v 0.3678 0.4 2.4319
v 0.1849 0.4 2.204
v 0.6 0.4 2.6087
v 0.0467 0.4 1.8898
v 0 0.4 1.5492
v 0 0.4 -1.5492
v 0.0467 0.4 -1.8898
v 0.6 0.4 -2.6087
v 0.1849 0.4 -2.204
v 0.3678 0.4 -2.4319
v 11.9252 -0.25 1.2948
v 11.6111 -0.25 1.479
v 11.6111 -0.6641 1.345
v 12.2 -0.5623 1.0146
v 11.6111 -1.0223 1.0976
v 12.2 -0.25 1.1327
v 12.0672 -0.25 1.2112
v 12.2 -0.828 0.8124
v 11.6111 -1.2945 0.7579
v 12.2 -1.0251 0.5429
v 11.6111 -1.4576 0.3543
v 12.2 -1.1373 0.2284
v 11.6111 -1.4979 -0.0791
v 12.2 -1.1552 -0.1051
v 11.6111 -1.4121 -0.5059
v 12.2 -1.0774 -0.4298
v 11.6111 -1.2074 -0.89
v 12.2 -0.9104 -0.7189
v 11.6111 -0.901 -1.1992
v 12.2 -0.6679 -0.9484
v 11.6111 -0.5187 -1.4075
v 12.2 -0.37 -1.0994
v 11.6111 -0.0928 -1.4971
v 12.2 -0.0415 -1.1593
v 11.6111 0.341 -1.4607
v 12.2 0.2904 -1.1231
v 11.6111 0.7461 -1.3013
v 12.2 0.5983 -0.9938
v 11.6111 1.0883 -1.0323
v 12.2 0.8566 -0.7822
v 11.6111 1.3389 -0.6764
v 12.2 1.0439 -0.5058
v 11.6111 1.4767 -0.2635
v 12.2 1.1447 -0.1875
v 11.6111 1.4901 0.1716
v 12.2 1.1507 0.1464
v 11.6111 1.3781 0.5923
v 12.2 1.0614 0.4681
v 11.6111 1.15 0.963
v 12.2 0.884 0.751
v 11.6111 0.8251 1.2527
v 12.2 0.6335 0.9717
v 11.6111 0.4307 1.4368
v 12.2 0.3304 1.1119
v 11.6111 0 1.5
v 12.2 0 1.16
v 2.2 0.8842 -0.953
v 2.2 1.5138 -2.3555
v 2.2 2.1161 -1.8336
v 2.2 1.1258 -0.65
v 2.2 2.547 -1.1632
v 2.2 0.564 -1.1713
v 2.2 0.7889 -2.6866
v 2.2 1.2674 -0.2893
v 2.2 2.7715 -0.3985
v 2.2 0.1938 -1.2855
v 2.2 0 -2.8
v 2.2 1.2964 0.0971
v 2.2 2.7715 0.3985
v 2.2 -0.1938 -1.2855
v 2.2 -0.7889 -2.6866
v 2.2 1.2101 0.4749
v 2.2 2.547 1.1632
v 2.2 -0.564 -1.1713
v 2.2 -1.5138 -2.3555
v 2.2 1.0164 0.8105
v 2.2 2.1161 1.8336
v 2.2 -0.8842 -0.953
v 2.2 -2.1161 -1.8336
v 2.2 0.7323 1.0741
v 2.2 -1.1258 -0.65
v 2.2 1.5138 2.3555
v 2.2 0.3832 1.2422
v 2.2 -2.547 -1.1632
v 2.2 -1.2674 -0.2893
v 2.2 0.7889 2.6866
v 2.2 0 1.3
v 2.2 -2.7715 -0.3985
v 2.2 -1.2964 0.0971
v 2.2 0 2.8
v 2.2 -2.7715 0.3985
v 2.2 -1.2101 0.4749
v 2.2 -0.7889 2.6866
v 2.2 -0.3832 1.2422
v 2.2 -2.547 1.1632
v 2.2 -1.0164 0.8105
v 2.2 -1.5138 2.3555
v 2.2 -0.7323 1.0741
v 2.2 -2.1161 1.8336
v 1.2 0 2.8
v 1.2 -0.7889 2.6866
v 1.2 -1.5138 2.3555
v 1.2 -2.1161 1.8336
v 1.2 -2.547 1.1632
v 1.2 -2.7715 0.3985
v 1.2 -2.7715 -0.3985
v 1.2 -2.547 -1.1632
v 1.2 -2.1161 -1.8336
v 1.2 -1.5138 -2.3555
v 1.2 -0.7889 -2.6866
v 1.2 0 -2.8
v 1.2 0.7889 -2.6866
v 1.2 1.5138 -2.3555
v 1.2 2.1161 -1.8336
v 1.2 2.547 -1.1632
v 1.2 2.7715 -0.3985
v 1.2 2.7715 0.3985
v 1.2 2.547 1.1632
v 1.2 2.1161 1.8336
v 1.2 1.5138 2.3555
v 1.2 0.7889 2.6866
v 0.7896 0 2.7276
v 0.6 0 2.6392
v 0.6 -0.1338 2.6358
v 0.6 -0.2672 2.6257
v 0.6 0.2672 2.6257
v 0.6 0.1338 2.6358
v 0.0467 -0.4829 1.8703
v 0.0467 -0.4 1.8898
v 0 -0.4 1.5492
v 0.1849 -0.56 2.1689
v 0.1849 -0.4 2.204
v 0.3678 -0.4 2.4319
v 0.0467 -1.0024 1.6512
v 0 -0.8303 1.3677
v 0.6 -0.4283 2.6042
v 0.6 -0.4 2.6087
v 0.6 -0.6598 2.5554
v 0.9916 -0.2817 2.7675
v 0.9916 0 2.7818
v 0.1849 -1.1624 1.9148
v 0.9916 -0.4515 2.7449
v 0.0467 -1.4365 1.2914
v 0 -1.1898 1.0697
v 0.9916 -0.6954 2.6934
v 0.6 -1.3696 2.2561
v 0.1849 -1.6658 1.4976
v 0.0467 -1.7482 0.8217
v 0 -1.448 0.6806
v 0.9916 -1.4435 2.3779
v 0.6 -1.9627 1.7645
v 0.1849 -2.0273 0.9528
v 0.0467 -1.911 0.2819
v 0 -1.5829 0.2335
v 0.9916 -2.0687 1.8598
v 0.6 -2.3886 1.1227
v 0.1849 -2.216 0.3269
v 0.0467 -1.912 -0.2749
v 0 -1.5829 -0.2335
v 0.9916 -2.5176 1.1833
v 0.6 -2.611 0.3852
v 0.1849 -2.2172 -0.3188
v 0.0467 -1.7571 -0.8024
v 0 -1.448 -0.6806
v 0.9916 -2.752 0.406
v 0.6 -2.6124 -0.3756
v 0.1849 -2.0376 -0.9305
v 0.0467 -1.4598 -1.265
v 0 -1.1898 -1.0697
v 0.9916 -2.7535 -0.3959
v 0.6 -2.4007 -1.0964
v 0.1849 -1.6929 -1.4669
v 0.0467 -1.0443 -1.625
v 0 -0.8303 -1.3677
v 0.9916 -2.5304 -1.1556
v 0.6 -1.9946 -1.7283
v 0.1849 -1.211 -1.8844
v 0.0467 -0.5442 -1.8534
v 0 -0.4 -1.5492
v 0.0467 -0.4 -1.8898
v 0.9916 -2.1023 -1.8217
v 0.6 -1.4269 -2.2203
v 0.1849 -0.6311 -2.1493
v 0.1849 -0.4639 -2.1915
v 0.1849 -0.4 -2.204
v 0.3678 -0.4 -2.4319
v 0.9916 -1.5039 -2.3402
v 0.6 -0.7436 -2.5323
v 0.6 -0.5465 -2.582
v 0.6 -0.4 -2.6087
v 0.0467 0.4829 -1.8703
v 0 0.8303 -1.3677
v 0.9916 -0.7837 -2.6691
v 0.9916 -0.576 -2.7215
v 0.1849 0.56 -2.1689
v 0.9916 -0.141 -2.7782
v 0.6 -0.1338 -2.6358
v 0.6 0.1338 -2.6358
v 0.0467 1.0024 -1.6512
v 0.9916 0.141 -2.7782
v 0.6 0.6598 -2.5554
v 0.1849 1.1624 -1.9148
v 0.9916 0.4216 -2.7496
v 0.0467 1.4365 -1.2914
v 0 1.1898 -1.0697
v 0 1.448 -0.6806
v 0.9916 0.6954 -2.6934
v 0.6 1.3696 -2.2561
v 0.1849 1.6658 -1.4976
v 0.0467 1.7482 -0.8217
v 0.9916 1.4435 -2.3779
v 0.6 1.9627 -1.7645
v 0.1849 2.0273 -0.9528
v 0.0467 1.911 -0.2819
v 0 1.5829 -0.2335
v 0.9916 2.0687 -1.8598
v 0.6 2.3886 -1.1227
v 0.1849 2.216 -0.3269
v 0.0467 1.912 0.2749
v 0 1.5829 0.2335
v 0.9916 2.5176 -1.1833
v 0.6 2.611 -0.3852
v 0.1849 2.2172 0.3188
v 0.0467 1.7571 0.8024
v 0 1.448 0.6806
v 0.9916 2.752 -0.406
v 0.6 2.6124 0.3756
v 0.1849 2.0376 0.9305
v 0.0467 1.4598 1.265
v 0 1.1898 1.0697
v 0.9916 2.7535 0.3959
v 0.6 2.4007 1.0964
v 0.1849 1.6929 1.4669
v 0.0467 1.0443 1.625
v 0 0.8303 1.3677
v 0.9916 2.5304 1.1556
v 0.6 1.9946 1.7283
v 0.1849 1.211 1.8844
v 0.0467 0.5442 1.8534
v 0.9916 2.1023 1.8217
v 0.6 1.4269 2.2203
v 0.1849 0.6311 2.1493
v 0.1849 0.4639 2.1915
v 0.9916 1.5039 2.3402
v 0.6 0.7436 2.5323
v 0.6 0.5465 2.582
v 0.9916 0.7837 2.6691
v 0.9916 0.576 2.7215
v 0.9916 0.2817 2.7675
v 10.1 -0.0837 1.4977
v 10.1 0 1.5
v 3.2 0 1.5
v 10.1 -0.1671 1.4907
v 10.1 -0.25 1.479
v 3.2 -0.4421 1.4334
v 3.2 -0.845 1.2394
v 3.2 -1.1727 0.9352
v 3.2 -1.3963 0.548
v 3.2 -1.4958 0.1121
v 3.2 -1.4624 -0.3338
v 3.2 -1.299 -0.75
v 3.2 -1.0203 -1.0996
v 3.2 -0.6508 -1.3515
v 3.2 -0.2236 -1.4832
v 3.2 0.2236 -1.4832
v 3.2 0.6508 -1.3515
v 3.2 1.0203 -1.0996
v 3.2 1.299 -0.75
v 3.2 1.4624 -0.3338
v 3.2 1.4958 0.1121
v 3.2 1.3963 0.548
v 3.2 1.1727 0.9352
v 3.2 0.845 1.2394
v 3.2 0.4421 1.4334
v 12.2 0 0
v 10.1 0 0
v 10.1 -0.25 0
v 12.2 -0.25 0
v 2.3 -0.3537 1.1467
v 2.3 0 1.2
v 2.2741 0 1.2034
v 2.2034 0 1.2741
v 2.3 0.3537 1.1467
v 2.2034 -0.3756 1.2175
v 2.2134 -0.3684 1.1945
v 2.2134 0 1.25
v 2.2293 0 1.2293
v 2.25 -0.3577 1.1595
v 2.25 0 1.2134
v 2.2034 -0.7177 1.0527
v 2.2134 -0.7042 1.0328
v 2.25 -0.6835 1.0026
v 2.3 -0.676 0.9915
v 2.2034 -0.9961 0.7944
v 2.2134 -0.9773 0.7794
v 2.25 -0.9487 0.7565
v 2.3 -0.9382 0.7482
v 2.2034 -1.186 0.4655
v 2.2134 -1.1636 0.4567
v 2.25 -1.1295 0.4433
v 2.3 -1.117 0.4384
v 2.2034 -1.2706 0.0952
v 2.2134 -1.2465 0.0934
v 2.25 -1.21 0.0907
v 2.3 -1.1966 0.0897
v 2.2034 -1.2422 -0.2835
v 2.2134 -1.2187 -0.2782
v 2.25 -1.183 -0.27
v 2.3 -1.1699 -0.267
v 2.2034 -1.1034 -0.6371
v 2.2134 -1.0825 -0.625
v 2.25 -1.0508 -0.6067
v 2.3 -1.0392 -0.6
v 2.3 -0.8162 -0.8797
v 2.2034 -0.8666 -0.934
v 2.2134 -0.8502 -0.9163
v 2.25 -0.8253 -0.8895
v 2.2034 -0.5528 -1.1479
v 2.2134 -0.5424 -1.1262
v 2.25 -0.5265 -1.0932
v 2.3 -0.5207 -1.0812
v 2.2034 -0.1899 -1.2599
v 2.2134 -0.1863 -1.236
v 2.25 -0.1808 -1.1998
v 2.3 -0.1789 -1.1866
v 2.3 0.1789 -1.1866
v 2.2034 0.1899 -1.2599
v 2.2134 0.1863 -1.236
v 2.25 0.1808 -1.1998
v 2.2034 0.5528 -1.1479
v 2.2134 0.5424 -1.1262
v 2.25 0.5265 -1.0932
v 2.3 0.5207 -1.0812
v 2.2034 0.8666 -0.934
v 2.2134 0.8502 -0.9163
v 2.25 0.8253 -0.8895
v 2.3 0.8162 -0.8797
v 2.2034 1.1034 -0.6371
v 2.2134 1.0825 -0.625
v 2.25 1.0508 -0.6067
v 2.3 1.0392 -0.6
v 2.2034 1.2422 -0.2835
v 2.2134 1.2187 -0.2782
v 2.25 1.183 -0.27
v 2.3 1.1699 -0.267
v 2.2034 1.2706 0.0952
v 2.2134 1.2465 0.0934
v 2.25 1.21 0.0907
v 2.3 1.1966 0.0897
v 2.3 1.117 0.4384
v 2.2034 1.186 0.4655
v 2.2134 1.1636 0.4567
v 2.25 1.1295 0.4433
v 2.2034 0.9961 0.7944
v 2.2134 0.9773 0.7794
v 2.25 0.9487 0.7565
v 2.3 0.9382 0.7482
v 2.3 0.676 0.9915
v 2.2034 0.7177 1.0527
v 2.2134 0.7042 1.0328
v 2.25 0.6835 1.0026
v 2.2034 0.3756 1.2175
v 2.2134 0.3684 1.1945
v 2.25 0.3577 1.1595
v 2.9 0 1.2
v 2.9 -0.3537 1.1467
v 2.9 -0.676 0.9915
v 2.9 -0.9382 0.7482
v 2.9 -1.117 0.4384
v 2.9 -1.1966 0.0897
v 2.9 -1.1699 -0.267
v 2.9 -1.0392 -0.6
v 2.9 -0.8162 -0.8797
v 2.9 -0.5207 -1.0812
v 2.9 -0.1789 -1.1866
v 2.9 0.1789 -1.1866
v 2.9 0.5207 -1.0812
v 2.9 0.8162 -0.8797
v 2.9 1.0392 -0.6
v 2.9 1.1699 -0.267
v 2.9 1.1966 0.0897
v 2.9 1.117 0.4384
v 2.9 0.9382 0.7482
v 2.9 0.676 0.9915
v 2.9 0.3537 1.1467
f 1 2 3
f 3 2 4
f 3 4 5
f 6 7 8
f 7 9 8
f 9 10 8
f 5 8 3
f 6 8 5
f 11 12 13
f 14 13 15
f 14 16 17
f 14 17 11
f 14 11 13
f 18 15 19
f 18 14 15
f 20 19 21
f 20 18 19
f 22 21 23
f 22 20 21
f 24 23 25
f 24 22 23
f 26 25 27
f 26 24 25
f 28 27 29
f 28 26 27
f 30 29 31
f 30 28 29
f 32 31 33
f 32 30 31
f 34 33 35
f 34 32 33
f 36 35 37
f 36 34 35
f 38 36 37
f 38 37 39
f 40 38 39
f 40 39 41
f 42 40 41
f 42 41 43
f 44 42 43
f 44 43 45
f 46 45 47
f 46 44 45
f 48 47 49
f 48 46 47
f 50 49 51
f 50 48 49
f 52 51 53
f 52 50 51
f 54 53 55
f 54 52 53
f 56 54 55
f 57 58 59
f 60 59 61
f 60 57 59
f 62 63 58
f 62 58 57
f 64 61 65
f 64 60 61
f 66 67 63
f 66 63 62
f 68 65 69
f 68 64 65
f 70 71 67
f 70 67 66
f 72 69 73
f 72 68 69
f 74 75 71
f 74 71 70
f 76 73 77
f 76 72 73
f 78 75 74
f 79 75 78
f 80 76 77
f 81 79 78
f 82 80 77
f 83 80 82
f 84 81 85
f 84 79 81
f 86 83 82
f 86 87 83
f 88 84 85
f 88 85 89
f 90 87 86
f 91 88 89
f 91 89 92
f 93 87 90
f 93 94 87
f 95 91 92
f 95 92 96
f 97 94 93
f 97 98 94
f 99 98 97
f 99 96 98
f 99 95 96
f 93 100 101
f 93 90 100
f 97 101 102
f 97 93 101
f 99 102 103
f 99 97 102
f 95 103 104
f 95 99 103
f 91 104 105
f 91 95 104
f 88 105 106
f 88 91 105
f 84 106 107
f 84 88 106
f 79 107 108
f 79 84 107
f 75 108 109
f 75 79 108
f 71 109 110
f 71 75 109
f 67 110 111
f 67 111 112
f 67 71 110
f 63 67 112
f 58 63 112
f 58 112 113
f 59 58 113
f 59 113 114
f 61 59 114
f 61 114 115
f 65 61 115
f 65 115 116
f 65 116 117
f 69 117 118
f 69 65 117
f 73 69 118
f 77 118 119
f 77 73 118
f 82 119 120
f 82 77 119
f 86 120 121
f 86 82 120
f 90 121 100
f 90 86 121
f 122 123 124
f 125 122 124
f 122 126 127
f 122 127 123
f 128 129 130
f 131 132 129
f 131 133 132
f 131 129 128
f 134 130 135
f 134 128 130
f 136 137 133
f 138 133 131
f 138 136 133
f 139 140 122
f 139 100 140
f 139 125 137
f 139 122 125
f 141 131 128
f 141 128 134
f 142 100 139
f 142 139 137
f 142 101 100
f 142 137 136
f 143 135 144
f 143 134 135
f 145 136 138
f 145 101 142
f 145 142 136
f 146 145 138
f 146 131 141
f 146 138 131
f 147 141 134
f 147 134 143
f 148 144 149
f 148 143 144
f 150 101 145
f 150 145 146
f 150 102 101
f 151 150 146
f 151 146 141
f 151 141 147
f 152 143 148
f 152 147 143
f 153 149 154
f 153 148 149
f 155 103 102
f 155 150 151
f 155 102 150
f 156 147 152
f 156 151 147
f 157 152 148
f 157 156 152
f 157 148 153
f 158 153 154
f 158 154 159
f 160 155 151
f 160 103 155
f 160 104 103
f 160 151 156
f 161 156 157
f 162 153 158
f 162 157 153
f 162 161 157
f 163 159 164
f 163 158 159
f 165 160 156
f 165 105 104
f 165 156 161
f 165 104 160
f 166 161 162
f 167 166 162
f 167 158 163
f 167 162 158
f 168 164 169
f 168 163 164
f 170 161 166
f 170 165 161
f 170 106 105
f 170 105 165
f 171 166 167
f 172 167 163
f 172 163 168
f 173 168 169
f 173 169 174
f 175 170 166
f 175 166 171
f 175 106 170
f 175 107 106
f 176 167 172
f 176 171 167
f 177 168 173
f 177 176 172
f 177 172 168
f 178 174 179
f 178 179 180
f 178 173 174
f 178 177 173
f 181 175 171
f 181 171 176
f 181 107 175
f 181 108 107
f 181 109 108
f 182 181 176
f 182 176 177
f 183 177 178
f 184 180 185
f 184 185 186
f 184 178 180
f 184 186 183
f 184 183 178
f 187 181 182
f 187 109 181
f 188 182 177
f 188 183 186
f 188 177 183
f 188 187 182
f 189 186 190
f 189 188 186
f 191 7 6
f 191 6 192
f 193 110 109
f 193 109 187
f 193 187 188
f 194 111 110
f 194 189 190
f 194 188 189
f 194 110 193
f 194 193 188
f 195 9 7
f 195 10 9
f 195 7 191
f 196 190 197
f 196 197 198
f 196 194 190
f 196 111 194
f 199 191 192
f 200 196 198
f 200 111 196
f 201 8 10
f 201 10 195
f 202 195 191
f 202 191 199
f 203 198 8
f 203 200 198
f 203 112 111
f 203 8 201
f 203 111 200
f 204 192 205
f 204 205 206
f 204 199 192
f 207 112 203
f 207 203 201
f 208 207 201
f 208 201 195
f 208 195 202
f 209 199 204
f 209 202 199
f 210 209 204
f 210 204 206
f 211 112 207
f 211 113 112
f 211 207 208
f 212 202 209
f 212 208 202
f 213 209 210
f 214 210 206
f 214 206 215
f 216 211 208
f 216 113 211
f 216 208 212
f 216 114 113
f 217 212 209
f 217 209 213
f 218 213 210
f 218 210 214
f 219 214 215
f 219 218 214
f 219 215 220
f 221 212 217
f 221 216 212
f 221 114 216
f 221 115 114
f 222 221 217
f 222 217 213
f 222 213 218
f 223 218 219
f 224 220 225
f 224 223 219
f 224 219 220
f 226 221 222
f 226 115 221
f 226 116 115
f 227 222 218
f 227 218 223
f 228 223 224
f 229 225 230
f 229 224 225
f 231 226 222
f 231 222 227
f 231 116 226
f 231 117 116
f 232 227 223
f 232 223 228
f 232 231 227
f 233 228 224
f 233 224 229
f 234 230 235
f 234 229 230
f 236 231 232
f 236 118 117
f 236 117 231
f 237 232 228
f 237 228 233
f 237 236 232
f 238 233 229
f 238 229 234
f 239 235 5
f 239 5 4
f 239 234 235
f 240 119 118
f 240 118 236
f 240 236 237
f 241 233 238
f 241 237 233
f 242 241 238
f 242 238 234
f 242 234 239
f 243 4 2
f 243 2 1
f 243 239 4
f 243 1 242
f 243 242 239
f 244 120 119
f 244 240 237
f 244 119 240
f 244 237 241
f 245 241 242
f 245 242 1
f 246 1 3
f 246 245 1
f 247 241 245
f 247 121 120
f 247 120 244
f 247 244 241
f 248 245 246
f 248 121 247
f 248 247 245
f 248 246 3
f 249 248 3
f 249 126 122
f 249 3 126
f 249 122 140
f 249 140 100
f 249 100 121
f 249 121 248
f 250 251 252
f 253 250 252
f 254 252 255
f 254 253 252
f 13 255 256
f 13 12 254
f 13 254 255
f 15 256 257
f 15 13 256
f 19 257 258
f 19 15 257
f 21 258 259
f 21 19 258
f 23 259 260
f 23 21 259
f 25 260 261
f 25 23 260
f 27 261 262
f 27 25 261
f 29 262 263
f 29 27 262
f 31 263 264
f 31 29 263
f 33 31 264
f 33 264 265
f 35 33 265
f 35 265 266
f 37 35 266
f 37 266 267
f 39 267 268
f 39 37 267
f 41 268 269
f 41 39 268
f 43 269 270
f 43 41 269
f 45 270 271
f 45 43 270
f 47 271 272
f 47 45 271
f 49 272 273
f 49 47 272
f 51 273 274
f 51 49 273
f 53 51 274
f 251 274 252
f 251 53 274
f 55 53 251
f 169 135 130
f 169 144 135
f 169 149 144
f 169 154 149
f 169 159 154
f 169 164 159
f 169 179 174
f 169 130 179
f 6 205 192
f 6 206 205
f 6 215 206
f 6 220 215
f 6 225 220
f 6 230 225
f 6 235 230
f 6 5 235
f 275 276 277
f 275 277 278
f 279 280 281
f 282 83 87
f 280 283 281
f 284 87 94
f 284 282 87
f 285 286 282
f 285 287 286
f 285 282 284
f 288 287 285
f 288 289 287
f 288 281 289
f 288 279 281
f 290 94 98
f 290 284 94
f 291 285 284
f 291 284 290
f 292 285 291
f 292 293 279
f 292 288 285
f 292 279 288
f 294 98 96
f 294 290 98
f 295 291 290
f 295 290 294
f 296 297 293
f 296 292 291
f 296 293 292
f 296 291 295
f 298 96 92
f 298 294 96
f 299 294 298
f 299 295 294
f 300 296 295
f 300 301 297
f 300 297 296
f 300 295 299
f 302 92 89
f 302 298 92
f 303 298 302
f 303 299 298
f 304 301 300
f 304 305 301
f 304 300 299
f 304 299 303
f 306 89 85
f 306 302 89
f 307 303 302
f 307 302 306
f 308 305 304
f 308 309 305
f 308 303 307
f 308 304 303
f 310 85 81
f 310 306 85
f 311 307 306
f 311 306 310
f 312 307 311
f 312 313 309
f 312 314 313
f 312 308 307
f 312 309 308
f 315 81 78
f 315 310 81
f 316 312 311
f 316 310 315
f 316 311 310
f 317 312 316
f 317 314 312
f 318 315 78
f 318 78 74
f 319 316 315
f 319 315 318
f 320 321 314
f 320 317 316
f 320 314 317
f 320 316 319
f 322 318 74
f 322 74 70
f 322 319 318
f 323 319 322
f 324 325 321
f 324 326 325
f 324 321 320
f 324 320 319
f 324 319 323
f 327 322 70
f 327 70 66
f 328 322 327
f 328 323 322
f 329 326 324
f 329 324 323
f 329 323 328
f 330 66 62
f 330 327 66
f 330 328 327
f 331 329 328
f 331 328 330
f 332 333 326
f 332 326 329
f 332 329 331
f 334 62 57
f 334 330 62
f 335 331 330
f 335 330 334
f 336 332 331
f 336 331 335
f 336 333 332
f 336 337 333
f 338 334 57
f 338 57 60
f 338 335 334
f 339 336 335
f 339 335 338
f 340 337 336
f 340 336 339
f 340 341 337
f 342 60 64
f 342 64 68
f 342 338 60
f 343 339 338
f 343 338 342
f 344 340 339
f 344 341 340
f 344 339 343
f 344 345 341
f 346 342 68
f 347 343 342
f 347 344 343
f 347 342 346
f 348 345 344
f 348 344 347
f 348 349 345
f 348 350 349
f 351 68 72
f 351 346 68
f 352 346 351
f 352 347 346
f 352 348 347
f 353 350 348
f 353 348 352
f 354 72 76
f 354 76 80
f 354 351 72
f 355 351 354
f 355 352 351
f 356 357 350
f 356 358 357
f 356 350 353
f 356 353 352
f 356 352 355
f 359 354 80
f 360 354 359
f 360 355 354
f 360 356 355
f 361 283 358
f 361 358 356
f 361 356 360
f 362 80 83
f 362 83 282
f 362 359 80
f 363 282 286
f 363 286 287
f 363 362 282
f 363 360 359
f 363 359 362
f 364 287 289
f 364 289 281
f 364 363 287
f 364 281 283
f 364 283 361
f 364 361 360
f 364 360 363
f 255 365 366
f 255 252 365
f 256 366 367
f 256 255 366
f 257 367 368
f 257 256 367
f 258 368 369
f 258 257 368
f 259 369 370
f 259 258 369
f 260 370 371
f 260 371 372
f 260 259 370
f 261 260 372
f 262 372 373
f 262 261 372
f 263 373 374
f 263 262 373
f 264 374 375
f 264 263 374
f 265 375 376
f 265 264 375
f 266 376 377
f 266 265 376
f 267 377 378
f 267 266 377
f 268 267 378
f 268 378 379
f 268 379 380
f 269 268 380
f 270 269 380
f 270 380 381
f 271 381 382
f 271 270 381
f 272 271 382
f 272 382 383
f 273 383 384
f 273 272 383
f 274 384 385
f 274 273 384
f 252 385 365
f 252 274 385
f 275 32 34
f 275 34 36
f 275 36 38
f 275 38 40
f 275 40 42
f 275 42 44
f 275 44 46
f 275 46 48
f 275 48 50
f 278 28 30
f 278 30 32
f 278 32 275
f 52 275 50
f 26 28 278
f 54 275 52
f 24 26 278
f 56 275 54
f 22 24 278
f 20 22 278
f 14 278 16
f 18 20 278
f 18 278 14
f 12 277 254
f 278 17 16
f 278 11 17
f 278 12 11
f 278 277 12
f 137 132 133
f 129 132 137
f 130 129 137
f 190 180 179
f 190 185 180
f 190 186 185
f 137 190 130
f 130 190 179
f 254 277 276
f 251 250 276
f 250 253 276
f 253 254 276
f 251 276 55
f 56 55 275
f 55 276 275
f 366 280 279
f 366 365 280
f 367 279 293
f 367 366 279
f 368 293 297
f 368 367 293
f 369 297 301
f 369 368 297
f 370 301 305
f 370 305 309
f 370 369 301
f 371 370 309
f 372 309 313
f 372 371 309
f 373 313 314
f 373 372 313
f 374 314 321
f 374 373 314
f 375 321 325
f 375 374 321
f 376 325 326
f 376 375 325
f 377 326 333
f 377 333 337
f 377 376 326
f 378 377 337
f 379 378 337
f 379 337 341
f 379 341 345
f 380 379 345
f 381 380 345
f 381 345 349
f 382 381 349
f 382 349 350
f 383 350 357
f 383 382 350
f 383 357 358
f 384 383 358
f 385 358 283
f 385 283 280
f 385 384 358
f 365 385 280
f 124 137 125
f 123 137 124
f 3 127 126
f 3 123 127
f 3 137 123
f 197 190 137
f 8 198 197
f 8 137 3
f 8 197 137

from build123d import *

# Parameters (mm, degrees)
SLOT_CUT_EXTRUDE1_DEPTH      = 13.826535018
SLOT_CUT_EXTRUDE1_DEPTH_BACK = 13.826535018
SKETCH2_W                    = 0.6
SKETCH2_H                    = 0.8
SKETCH11_W                   = 2.1
SKETCH11_H                   = 0.25
POINT_CUT_EXTRUDE8_DEPTH     = 13.82653504


with BuildPart() as part:
    # Sketch1 → base-Revolve (revolve)
    with BuildSketch(Plane.XY, mode=Mode.PRIVATE) as base_revolve_sk:
        with BuildLine():
            Line((0, 0), (0, 1.6))
            ThreePointArc((0, 1.6), (0.351471863, 2.448528137), (1.2, 2.8))
            Line((1.2, 2.8), (2.2, 2.8))
            Line((2.2, 2.8), (2.2, 1.3))
            ThreePointArc((2.2, 1.3), (2.229289322, 1.229289322), (2.3, 1.2))
            Line((2.3, 1.2), (2.9, 1.2))
            Line((2.9, 1.2), (3.2, 1.5))
            Line((3.2, 1.5), (12.2, 1.5))
            Line((12.2, 1.5), (12.2, 0))
            Line((12.2, 0), (0, 0))
        make_face()
    revolve(base_revolve_sk.sketch.rotate(Axis((0, 0, 0), (1, 0, 0)), 90), axis=Axis((0, 0, 0), (1, 0, 0)))

    # Sketch2 → slot_Cut-Extrude1 (cut, two sides: drawn at the far end of the back side and taken through both)
    with BuildSketch(Plane.XY.offset(-SLOT_CUT_EXTRUDE1_DEPTH_BACK)):
        with Locations((0.3, 0)):
            Rectangle(SKETCH2_W, SKETCH2_H)
    extrude(amount=SLOT_CUT_EXTRUDE1_DEPTH + SLOT_CUT_EXTRUDE1_DEPTH_BACK, mode=Mode.SUBTRACT)

    # Sketch8 → point_Cut-Revolve1 (revolve, cut)
    with BuildSketch(Plane.XY, mode=Mode.PRIVATE) as point_cut_revolve1_sk:
        Polygon((12.2, 0), (12.708, 0), (12.708, 2.008), (11.611102725, 2.008), (11.611102725, 1.5), (12.2, 1.16), align=None)
    revolve(point_cut_revolve1_sk.sketch.rotate(Axis((0, 0, 0), (1, 0, 0)), 90), axis=Axis((0, 0, 0), (1, 0, 0)), mode=Mode.SUBTRACT)

    # Sketch11 → point_Cut-Extrude8 (cut, through all)
    with BuildSketch(Plane.XY):
        with Locations((11.15, -0.125)):
            Rectangle(SKETCH11_W, SKETCH11_H)
    extrude(amount=POINT_CUT_EXTRUDE8_DEPTH, mode=Mode.SUBTRACT)


solid = part.part
